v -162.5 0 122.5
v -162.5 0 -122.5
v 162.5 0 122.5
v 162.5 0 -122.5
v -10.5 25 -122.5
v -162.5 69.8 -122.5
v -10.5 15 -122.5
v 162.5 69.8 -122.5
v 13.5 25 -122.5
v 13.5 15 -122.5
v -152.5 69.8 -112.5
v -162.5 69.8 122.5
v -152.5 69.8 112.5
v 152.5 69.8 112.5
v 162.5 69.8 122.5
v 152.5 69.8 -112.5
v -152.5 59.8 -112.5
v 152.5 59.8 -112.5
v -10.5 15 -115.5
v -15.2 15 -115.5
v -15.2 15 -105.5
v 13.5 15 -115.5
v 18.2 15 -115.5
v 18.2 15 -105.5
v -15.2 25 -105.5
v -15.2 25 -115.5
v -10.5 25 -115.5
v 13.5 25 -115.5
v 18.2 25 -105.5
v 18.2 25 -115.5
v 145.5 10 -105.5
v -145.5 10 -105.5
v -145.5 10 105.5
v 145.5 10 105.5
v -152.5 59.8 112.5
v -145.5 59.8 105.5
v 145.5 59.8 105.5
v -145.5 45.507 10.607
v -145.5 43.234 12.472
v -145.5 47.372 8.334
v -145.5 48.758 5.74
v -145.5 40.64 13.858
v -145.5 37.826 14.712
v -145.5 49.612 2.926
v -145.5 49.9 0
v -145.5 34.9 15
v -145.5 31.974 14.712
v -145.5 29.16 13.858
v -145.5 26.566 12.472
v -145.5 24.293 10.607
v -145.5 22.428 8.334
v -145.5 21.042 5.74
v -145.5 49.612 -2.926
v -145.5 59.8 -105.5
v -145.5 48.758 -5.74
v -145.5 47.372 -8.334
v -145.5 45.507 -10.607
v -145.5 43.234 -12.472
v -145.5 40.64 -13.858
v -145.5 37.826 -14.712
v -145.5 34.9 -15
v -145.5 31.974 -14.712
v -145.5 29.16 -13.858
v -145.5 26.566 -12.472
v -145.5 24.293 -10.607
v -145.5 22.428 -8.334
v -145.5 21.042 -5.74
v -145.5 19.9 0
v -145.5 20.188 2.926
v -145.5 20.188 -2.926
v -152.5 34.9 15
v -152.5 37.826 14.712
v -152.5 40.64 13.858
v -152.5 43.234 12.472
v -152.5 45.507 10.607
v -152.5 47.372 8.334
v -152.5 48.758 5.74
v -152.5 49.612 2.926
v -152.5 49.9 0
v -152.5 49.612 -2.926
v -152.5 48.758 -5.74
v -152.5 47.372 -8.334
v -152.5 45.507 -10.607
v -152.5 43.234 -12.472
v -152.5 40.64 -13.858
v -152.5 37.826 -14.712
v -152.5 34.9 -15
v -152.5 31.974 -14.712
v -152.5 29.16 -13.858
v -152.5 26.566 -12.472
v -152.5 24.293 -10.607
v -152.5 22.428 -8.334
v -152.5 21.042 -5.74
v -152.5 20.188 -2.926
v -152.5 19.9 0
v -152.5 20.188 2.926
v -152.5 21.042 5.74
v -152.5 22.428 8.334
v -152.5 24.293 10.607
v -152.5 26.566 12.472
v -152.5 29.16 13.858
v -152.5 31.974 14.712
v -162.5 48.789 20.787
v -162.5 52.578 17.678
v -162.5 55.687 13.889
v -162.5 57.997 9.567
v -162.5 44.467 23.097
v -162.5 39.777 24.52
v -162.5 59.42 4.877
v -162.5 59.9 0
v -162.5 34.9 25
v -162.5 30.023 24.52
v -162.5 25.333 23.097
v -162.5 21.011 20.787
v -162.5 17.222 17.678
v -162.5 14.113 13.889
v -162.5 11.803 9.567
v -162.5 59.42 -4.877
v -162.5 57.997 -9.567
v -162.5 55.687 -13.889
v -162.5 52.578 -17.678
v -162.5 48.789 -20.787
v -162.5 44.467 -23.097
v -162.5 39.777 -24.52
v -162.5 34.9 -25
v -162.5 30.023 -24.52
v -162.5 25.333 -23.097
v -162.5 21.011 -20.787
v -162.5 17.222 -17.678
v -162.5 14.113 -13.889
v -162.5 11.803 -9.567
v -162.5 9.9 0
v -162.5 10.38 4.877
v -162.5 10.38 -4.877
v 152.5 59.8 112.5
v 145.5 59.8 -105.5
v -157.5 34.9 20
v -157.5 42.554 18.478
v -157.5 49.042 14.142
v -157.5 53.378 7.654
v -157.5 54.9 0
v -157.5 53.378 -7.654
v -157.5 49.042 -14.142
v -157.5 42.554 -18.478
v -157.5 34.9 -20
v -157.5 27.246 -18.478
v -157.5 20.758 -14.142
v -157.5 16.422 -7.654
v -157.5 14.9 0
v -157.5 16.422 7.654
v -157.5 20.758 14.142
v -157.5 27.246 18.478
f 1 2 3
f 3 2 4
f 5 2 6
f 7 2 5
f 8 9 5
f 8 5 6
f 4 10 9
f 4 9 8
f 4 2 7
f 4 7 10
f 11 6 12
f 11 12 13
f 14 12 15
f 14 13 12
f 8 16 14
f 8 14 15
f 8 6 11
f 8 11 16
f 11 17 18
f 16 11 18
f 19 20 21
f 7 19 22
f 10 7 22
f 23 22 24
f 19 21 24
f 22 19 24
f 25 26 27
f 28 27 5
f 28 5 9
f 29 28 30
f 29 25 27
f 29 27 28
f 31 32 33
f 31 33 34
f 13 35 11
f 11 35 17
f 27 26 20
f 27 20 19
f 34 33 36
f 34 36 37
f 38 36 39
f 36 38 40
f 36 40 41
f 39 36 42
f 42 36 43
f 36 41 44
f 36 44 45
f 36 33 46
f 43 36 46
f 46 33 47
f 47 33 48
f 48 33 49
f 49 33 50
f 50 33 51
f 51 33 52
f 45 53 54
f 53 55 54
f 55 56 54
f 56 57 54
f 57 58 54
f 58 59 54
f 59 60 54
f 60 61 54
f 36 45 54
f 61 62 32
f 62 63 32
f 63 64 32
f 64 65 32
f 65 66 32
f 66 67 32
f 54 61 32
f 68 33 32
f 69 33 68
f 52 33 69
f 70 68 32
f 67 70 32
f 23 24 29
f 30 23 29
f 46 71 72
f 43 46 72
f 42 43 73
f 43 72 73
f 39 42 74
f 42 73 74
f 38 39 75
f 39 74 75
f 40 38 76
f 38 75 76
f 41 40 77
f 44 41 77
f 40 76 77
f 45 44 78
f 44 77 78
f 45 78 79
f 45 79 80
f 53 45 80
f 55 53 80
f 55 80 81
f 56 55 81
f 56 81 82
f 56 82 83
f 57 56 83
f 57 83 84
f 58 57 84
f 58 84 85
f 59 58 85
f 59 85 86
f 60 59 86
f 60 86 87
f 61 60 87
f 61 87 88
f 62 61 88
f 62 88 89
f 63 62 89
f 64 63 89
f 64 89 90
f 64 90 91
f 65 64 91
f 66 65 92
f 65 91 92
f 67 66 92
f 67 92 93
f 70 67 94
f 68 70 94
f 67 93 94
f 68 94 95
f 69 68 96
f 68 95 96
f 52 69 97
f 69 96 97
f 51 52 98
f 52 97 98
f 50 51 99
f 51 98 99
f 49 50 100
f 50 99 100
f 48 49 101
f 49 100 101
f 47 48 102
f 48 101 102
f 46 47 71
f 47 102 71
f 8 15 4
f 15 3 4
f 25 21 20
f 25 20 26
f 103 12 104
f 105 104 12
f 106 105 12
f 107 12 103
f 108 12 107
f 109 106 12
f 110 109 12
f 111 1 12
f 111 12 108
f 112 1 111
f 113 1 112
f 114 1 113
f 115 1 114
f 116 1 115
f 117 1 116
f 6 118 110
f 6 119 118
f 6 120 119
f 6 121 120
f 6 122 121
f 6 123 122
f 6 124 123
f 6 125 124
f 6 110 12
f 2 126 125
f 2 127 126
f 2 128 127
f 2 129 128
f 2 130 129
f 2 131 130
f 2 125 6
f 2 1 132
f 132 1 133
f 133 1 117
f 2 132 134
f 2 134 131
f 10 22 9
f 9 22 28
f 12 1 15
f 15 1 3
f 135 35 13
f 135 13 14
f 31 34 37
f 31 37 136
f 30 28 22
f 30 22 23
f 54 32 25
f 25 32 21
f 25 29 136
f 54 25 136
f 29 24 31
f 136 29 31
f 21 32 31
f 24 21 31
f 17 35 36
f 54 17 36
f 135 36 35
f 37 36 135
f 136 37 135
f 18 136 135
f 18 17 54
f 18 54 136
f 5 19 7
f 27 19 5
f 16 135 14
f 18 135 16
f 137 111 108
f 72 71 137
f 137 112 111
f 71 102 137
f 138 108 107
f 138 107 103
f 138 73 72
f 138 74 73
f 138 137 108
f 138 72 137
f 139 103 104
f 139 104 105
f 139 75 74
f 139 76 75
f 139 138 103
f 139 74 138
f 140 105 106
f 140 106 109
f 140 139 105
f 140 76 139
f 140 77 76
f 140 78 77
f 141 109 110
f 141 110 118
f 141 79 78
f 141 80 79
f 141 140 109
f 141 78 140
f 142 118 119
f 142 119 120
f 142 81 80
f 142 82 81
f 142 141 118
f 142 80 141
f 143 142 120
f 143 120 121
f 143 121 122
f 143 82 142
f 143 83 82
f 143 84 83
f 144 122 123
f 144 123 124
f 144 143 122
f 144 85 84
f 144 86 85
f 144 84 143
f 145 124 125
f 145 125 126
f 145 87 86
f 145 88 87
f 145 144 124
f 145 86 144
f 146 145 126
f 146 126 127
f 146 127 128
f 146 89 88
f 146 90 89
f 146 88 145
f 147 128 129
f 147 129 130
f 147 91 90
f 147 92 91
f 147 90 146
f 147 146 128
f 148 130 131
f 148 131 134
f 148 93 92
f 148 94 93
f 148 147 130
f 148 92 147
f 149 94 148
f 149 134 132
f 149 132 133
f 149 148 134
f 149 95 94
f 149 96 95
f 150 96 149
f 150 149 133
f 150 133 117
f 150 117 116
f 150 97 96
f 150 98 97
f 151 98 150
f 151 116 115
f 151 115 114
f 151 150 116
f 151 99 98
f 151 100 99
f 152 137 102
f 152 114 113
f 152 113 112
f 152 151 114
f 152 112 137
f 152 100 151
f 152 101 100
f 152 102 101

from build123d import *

# Parameters (mm, degrees)
SKETCH1_W           = 325
SKETCH1_H           = 245
BOSS_EXTRUDE1_DEPTH = 10
SKETCH2_W           = 325
SKETCH2_H           = 245
SKETCH2_W_2         = 291
SKETCH2_H_2         = 211
BOSS_EXTRUDE2_DEPTH = 49.8
SKETCH3_W           = 325
SKETCH3_H           = 245
SKETCH3_W_2         = 305
SKETCH3_H_2         = 225
BOSS_EXTRUDE3_DEPTH = 10
SKETCH4_R           = 15
CUT_EXTRUDE1_DEPTH  = 30
CHAMFER1_SIZE       = 10
SKETCH5_W           = 24
SKETCH5_H           = 10
CUT_EXTRUDE2_DEPTH  = 289.552057695
SKETCH6_W           = 33.4
SKETCH6_H           = 10
CUT_EXTRUDE3_DEPTH  = 10


with BuildPart() as part:
    # Sketch1 → Boss-Extrude1 (new body)
    with BuildSketch(Plane(origin=(0, 0, 0), x_dir=(1, 0, 0), z_dir=(0, 1, 0))):
        Rectangle(SKETCH1_W, SKETCH1_H)
    extrude(amount=BOSS_EXTRUDE1_DEPTH)

    # Sketch2 → Boss-Extrude2 (add)
    with BuildSketch(Plane(origin=(0, 10, 0), x_dir=(1, 0, 0), z_dir=(0, 1, 0))):
        Rectangle(SKETCH2_W, SKETCH2_H)
        Rectangle(SKETCH2_W_2, SKETCH2_H_2, mode=Mode.SUBTRACT)
    extrude(amount=BOSS_EXTRUDE2_DEPTH)

    # Sketch3 → Boss-Extrude3 (add)
    with BuildSketch(Plane(origin=(0, 59.8, 0), x_dir=(1, 0, 0), z_dir=(0, 1, 0))):
        Rectangle(SKETCH3_W, SKETCH3_H)
        Rectangle(SKETCH3_W_2, SKETCH3_H_2, mode=Mode.SUBTRACT)
    extrude(amount=BOSS_EXTRUDE3_DEPTH)

    # Sketch4 → Cut-Extrude1 (cut)
    with BuildSketch(Plane.ZY.offset(162.5)):
        with Locations((0, 34.9)):
            Circle(SKETCH4_R)
    extrude(amount=-CUT_EXTRUDE1_DEPTH, mode=Mode.SUBTRACT)

    # Chamfer1
    chamfer1_edges = [part.edges().sort_by_distance(p)[0] for p in [
        (-162.5, 34.9, -15),
    ]]
    chamfer(chamfer1_edges, length=CHAMFER1_SIZE)

    # Sketch5 → Cut-Extrude2 (cut, through all)
    with BuildSketch(Plane.XY.offset(-105.5)):
        with Locations((1.5, 20)):
            Rectangle(SKETCH5_W, SKETCH5_H)
    extrude(amount=-CUT_EXTRUDE2_DEPTH, mode=Mode.SUBTRACT)

    # Sketch6 → Cut-Extrude3 (cut)
    with BuildSketch(Plane.XY.offset(-105.5)):
        with Locations((1.5, 20)):
            Rectangle(SKETCH6_W, SKETCH6_H)
    extrude(amount=-CUT_EXTRUDE3_DEPTH, mode=Mode.SUBTRACT)


solid = part.part
